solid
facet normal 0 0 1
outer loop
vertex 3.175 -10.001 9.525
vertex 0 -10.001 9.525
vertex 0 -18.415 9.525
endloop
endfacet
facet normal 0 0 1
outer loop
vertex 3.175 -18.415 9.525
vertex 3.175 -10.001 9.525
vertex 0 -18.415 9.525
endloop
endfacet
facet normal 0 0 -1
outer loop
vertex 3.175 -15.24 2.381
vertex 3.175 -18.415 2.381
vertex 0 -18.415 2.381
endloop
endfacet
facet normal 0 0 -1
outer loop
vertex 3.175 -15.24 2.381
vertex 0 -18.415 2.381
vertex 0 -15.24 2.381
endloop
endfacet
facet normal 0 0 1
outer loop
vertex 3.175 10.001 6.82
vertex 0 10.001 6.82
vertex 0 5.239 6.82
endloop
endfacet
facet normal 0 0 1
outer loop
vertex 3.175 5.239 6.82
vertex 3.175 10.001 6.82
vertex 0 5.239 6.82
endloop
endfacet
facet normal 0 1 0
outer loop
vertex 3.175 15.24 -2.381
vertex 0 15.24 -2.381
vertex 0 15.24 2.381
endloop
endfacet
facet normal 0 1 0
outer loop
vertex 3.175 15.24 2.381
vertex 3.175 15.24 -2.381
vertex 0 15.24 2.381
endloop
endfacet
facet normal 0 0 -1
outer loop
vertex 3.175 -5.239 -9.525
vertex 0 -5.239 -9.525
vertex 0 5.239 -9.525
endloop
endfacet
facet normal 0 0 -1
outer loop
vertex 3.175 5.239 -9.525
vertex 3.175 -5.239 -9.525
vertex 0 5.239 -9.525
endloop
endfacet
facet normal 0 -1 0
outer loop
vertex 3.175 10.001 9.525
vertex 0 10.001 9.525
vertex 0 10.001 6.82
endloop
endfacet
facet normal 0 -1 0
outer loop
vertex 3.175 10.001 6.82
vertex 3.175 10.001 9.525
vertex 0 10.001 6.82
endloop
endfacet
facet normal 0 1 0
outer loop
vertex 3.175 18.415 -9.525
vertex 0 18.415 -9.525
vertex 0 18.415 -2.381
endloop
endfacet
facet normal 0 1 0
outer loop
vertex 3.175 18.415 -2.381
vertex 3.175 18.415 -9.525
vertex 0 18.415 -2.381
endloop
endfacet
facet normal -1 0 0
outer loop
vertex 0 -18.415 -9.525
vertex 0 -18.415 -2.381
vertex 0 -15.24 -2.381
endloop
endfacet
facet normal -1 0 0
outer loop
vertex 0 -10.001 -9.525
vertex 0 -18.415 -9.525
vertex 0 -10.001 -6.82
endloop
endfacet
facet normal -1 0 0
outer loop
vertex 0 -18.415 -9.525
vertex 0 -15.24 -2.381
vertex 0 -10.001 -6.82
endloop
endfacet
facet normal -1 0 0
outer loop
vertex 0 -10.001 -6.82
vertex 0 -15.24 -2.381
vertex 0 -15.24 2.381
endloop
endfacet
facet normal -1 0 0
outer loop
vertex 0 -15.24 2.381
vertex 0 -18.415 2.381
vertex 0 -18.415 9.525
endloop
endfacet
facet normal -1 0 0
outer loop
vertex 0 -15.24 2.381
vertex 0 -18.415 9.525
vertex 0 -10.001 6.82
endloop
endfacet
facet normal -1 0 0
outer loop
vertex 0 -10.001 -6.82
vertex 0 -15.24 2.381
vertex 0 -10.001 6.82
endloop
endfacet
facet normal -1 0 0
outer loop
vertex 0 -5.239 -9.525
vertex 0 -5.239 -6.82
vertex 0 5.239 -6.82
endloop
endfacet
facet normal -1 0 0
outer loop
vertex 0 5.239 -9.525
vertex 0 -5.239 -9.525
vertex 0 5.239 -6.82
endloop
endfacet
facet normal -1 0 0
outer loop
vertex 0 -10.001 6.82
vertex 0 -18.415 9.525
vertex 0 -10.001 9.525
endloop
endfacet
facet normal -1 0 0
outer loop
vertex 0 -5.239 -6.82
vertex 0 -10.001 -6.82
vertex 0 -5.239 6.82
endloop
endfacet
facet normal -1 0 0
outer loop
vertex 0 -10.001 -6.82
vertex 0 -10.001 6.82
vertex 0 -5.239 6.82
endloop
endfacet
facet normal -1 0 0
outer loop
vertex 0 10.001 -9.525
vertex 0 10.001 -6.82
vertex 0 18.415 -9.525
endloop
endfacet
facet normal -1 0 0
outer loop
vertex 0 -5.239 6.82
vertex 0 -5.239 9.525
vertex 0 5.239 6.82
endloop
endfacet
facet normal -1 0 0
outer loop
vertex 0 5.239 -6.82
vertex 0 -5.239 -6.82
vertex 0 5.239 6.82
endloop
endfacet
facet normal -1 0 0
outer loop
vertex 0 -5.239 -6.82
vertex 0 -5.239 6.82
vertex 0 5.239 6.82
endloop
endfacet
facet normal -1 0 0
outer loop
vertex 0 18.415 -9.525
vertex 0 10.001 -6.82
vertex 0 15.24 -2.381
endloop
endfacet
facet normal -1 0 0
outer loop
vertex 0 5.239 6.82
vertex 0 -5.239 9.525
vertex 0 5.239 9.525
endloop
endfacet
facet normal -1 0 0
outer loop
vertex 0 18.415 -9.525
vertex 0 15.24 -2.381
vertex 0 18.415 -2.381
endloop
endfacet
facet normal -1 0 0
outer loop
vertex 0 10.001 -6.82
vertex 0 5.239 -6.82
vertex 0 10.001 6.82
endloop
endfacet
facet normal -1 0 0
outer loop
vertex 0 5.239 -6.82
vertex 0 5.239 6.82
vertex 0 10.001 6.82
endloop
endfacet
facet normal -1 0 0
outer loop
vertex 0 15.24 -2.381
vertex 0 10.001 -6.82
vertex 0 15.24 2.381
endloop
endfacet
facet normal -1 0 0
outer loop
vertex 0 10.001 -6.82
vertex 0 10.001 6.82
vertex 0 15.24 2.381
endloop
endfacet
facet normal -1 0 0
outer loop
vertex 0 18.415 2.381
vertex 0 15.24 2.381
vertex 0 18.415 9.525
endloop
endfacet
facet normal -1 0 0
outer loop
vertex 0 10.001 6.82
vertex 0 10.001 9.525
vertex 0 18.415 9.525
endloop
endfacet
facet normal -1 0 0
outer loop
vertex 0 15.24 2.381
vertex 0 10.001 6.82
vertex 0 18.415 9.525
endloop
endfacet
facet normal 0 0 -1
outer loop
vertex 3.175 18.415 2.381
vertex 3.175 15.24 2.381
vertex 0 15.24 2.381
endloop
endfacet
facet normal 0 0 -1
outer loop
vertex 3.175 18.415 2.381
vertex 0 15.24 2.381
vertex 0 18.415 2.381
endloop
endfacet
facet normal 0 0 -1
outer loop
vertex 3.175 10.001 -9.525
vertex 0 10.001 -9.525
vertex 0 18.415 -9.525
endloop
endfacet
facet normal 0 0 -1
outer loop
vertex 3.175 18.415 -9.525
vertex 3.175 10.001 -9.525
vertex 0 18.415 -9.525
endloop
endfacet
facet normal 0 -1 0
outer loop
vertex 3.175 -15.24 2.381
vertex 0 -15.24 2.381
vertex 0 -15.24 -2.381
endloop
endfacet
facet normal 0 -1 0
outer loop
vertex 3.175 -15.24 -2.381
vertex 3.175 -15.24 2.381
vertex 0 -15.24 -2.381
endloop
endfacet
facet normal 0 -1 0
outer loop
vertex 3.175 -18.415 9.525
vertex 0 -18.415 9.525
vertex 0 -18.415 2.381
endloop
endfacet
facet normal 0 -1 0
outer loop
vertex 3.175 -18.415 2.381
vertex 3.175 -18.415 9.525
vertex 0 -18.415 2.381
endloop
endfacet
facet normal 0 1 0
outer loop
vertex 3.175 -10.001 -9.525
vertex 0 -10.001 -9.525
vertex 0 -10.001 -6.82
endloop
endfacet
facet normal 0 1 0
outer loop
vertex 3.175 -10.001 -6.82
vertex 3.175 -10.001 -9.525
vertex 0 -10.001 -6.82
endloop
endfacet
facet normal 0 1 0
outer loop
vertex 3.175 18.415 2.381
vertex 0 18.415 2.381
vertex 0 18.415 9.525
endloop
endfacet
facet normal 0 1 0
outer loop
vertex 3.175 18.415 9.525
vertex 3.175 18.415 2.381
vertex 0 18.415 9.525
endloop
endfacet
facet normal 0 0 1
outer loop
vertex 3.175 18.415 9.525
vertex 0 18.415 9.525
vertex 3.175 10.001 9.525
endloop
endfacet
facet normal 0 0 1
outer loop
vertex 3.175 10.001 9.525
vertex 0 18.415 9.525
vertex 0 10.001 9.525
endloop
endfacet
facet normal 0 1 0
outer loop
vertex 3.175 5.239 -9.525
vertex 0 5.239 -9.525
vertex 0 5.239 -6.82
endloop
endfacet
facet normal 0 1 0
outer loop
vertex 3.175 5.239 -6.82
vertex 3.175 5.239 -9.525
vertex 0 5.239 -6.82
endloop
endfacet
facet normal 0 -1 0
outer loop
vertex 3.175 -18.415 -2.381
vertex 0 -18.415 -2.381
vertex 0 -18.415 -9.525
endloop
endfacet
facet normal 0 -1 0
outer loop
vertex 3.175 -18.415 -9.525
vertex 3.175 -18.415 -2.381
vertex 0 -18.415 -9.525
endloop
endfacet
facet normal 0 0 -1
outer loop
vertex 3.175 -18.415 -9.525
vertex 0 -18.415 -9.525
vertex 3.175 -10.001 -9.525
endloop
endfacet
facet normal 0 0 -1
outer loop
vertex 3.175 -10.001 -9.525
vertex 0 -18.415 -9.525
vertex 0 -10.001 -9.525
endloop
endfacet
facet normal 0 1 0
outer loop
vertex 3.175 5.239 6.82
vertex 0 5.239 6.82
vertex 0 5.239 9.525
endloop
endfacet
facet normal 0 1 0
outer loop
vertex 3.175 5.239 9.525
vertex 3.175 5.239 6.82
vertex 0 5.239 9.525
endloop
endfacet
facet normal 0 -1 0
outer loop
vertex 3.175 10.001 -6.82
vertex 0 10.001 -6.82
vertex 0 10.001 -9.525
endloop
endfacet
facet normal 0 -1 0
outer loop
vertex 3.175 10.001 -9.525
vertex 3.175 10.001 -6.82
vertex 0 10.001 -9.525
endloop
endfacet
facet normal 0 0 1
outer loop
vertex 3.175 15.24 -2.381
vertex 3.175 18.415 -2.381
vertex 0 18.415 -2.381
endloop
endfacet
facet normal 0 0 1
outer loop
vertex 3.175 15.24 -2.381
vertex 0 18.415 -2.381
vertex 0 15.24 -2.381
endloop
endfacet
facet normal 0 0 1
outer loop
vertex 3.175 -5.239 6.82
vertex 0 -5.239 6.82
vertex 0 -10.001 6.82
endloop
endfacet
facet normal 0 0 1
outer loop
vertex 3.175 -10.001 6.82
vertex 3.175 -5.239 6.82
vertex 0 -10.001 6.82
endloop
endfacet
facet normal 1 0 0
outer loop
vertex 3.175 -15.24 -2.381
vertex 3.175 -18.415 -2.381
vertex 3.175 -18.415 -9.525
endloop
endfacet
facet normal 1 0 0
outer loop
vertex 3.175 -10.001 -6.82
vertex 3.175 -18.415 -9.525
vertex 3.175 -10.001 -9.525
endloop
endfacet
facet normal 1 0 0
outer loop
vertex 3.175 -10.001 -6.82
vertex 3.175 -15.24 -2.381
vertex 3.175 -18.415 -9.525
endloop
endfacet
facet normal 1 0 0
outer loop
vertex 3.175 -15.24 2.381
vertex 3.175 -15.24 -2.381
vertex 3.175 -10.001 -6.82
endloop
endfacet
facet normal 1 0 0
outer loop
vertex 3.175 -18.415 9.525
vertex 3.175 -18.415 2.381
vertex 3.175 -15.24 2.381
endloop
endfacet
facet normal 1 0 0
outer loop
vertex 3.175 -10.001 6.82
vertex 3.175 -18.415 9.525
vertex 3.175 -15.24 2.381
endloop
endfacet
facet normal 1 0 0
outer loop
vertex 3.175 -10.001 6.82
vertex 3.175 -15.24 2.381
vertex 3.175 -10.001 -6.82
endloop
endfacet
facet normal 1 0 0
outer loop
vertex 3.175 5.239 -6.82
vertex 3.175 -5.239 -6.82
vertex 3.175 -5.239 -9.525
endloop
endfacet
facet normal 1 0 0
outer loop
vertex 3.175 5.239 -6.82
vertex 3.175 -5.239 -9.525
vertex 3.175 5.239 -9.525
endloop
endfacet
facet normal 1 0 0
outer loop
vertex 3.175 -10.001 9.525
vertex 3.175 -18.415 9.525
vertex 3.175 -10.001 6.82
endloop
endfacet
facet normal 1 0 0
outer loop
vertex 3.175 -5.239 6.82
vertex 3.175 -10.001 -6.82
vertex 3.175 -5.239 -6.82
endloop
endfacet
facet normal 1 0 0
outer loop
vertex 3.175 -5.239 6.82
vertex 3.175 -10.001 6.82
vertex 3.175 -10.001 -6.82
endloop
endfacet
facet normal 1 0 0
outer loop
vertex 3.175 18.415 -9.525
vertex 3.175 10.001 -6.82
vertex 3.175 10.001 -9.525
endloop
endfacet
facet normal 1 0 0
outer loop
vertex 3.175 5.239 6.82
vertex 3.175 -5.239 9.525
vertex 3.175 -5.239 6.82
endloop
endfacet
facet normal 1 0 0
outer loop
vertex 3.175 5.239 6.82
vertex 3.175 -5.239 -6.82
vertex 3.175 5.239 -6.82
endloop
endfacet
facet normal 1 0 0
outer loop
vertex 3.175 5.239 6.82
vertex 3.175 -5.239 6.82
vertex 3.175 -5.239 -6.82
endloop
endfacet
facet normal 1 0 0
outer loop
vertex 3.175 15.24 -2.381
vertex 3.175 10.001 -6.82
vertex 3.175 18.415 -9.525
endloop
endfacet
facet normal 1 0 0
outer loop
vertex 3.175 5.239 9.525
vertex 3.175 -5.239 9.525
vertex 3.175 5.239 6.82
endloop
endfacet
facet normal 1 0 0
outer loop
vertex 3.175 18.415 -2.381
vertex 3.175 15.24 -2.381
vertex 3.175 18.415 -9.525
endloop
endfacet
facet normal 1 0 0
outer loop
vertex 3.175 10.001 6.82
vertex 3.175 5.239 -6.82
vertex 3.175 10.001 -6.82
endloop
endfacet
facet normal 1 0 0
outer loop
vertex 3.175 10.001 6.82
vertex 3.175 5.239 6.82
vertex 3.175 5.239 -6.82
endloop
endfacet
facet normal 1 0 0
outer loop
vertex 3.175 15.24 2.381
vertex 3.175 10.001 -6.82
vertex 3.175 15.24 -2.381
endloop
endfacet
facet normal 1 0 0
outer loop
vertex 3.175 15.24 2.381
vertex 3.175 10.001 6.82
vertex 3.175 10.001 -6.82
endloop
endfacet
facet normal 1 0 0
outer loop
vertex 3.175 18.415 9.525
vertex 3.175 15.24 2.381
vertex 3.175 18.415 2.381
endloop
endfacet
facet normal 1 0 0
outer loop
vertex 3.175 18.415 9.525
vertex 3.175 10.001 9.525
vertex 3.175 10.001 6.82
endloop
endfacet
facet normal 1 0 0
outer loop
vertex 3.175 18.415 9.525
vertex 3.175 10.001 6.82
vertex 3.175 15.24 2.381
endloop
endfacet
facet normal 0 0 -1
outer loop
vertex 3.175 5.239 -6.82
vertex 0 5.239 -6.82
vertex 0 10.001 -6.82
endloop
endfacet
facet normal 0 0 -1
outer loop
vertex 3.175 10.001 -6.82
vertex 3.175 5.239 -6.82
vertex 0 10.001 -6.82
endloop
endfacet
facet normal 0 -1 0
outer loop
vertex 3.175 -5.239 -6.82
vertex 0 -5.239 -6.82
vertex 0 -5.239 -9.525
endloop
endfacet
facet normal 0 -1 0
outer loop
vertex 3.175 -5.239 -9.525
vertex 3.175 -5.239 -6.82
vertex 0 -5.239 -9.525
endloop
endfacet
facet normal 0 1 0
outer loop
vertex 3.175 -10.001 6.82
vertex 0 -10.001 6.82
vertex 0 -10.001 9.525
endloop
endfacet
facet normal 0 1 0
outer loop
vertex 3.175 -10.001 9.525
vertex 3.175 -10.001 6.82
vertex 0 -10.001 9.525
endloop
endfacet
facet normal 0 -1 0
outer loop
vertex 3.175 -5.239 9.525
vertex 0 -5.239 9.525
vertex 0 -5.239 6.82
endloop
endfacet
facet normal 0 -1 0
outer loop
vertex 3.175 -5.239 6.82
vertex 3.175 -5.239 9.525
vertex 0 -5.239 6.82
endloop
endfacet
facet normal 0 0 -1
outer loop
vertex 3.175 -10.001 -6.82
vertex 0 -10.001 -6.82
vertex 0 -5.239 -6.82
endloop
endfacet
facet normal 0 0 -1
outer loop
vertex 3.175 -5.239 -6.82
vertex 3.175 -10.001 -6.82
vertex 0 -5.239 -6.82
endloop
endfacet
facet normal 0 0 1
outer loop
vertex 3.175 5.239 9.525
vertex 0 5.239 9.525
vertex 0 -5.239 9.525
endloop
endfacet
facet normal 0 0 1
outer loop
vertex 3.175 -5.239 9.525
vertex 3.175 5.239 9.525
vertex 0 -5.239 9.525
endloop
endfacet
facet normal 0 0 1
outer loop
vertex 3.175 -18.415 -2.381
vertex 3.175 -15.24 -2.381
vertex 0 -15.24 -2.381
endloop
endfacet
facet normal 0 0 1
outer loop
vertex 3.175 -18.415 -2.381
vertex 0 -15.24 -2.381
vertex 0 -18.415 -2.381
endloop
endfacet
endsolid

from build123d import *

# Parameters (mm, degrees)
F1_DEPTH = 3.175


with BuildPart() as f1:
    # F0 (on Right) → F1 (new body)
    with BuildSketch(Plane.YZ):
        Polygon((-15.24, 0), (-7.62, 0), (-7.62, 6.819678), (-10.00125, 6.819678), (-10.00125, 9.525), (-18.415, 9.525), (-18.415, 2.38125), (-15.24, 2.38125), align=None)
        Polygon((5.23875, 6.819678), (5.23875, 9.525), (0, 9.525), (0, 0), (7.62, 0), (7.62, 6.819678), align=None)
        Polygon((0, 0), (0, 9.525), (-5.23875, 9.525), (-5.23875, 6.819678), (-7.62, 6.819678), (-7.62, 0), align=None)
        Polygon((18.415, 2.38125), (18.415, 9.525), (10.00125, 9.525), (10.00125, 6.819678), (7.62, 6.819678), (7.62, 0), (15.24, 0), (15.24, 2.38125), align=None)
        Polygon((18.415, -9.525), (18.415, -2.38125), (15.24, -2.38125), (15.24, 0), (7.62, 0), (7.62, -6.819678), (10.00125, -6.819678), (10.00125, -9.525), align=None)
        Polygon((0, -9.525), (0, 0), (-7.62, 0), (-7.62, -6.819678), (-5.23875, -6.819678), (-5.23875, -9.525), align=None)
        Polygon((7.62, -6.819678), (7.62, 0), (0, 0), (0, -9.525), (5.23875, -9.525), (5.23875, -6.819678), align=None)
        Polygon((-7.62, -6.819678), (-7.62, 0), (-15.24, 0), (-15.24, -2.38125), (-18.415, -2.38125), (-18.415, -9.525), (-10.00125, -9.525), (-10.00125, -6.819678), align=None)
    extrude(amount=F1_DEPTH)


solid = f1.part
